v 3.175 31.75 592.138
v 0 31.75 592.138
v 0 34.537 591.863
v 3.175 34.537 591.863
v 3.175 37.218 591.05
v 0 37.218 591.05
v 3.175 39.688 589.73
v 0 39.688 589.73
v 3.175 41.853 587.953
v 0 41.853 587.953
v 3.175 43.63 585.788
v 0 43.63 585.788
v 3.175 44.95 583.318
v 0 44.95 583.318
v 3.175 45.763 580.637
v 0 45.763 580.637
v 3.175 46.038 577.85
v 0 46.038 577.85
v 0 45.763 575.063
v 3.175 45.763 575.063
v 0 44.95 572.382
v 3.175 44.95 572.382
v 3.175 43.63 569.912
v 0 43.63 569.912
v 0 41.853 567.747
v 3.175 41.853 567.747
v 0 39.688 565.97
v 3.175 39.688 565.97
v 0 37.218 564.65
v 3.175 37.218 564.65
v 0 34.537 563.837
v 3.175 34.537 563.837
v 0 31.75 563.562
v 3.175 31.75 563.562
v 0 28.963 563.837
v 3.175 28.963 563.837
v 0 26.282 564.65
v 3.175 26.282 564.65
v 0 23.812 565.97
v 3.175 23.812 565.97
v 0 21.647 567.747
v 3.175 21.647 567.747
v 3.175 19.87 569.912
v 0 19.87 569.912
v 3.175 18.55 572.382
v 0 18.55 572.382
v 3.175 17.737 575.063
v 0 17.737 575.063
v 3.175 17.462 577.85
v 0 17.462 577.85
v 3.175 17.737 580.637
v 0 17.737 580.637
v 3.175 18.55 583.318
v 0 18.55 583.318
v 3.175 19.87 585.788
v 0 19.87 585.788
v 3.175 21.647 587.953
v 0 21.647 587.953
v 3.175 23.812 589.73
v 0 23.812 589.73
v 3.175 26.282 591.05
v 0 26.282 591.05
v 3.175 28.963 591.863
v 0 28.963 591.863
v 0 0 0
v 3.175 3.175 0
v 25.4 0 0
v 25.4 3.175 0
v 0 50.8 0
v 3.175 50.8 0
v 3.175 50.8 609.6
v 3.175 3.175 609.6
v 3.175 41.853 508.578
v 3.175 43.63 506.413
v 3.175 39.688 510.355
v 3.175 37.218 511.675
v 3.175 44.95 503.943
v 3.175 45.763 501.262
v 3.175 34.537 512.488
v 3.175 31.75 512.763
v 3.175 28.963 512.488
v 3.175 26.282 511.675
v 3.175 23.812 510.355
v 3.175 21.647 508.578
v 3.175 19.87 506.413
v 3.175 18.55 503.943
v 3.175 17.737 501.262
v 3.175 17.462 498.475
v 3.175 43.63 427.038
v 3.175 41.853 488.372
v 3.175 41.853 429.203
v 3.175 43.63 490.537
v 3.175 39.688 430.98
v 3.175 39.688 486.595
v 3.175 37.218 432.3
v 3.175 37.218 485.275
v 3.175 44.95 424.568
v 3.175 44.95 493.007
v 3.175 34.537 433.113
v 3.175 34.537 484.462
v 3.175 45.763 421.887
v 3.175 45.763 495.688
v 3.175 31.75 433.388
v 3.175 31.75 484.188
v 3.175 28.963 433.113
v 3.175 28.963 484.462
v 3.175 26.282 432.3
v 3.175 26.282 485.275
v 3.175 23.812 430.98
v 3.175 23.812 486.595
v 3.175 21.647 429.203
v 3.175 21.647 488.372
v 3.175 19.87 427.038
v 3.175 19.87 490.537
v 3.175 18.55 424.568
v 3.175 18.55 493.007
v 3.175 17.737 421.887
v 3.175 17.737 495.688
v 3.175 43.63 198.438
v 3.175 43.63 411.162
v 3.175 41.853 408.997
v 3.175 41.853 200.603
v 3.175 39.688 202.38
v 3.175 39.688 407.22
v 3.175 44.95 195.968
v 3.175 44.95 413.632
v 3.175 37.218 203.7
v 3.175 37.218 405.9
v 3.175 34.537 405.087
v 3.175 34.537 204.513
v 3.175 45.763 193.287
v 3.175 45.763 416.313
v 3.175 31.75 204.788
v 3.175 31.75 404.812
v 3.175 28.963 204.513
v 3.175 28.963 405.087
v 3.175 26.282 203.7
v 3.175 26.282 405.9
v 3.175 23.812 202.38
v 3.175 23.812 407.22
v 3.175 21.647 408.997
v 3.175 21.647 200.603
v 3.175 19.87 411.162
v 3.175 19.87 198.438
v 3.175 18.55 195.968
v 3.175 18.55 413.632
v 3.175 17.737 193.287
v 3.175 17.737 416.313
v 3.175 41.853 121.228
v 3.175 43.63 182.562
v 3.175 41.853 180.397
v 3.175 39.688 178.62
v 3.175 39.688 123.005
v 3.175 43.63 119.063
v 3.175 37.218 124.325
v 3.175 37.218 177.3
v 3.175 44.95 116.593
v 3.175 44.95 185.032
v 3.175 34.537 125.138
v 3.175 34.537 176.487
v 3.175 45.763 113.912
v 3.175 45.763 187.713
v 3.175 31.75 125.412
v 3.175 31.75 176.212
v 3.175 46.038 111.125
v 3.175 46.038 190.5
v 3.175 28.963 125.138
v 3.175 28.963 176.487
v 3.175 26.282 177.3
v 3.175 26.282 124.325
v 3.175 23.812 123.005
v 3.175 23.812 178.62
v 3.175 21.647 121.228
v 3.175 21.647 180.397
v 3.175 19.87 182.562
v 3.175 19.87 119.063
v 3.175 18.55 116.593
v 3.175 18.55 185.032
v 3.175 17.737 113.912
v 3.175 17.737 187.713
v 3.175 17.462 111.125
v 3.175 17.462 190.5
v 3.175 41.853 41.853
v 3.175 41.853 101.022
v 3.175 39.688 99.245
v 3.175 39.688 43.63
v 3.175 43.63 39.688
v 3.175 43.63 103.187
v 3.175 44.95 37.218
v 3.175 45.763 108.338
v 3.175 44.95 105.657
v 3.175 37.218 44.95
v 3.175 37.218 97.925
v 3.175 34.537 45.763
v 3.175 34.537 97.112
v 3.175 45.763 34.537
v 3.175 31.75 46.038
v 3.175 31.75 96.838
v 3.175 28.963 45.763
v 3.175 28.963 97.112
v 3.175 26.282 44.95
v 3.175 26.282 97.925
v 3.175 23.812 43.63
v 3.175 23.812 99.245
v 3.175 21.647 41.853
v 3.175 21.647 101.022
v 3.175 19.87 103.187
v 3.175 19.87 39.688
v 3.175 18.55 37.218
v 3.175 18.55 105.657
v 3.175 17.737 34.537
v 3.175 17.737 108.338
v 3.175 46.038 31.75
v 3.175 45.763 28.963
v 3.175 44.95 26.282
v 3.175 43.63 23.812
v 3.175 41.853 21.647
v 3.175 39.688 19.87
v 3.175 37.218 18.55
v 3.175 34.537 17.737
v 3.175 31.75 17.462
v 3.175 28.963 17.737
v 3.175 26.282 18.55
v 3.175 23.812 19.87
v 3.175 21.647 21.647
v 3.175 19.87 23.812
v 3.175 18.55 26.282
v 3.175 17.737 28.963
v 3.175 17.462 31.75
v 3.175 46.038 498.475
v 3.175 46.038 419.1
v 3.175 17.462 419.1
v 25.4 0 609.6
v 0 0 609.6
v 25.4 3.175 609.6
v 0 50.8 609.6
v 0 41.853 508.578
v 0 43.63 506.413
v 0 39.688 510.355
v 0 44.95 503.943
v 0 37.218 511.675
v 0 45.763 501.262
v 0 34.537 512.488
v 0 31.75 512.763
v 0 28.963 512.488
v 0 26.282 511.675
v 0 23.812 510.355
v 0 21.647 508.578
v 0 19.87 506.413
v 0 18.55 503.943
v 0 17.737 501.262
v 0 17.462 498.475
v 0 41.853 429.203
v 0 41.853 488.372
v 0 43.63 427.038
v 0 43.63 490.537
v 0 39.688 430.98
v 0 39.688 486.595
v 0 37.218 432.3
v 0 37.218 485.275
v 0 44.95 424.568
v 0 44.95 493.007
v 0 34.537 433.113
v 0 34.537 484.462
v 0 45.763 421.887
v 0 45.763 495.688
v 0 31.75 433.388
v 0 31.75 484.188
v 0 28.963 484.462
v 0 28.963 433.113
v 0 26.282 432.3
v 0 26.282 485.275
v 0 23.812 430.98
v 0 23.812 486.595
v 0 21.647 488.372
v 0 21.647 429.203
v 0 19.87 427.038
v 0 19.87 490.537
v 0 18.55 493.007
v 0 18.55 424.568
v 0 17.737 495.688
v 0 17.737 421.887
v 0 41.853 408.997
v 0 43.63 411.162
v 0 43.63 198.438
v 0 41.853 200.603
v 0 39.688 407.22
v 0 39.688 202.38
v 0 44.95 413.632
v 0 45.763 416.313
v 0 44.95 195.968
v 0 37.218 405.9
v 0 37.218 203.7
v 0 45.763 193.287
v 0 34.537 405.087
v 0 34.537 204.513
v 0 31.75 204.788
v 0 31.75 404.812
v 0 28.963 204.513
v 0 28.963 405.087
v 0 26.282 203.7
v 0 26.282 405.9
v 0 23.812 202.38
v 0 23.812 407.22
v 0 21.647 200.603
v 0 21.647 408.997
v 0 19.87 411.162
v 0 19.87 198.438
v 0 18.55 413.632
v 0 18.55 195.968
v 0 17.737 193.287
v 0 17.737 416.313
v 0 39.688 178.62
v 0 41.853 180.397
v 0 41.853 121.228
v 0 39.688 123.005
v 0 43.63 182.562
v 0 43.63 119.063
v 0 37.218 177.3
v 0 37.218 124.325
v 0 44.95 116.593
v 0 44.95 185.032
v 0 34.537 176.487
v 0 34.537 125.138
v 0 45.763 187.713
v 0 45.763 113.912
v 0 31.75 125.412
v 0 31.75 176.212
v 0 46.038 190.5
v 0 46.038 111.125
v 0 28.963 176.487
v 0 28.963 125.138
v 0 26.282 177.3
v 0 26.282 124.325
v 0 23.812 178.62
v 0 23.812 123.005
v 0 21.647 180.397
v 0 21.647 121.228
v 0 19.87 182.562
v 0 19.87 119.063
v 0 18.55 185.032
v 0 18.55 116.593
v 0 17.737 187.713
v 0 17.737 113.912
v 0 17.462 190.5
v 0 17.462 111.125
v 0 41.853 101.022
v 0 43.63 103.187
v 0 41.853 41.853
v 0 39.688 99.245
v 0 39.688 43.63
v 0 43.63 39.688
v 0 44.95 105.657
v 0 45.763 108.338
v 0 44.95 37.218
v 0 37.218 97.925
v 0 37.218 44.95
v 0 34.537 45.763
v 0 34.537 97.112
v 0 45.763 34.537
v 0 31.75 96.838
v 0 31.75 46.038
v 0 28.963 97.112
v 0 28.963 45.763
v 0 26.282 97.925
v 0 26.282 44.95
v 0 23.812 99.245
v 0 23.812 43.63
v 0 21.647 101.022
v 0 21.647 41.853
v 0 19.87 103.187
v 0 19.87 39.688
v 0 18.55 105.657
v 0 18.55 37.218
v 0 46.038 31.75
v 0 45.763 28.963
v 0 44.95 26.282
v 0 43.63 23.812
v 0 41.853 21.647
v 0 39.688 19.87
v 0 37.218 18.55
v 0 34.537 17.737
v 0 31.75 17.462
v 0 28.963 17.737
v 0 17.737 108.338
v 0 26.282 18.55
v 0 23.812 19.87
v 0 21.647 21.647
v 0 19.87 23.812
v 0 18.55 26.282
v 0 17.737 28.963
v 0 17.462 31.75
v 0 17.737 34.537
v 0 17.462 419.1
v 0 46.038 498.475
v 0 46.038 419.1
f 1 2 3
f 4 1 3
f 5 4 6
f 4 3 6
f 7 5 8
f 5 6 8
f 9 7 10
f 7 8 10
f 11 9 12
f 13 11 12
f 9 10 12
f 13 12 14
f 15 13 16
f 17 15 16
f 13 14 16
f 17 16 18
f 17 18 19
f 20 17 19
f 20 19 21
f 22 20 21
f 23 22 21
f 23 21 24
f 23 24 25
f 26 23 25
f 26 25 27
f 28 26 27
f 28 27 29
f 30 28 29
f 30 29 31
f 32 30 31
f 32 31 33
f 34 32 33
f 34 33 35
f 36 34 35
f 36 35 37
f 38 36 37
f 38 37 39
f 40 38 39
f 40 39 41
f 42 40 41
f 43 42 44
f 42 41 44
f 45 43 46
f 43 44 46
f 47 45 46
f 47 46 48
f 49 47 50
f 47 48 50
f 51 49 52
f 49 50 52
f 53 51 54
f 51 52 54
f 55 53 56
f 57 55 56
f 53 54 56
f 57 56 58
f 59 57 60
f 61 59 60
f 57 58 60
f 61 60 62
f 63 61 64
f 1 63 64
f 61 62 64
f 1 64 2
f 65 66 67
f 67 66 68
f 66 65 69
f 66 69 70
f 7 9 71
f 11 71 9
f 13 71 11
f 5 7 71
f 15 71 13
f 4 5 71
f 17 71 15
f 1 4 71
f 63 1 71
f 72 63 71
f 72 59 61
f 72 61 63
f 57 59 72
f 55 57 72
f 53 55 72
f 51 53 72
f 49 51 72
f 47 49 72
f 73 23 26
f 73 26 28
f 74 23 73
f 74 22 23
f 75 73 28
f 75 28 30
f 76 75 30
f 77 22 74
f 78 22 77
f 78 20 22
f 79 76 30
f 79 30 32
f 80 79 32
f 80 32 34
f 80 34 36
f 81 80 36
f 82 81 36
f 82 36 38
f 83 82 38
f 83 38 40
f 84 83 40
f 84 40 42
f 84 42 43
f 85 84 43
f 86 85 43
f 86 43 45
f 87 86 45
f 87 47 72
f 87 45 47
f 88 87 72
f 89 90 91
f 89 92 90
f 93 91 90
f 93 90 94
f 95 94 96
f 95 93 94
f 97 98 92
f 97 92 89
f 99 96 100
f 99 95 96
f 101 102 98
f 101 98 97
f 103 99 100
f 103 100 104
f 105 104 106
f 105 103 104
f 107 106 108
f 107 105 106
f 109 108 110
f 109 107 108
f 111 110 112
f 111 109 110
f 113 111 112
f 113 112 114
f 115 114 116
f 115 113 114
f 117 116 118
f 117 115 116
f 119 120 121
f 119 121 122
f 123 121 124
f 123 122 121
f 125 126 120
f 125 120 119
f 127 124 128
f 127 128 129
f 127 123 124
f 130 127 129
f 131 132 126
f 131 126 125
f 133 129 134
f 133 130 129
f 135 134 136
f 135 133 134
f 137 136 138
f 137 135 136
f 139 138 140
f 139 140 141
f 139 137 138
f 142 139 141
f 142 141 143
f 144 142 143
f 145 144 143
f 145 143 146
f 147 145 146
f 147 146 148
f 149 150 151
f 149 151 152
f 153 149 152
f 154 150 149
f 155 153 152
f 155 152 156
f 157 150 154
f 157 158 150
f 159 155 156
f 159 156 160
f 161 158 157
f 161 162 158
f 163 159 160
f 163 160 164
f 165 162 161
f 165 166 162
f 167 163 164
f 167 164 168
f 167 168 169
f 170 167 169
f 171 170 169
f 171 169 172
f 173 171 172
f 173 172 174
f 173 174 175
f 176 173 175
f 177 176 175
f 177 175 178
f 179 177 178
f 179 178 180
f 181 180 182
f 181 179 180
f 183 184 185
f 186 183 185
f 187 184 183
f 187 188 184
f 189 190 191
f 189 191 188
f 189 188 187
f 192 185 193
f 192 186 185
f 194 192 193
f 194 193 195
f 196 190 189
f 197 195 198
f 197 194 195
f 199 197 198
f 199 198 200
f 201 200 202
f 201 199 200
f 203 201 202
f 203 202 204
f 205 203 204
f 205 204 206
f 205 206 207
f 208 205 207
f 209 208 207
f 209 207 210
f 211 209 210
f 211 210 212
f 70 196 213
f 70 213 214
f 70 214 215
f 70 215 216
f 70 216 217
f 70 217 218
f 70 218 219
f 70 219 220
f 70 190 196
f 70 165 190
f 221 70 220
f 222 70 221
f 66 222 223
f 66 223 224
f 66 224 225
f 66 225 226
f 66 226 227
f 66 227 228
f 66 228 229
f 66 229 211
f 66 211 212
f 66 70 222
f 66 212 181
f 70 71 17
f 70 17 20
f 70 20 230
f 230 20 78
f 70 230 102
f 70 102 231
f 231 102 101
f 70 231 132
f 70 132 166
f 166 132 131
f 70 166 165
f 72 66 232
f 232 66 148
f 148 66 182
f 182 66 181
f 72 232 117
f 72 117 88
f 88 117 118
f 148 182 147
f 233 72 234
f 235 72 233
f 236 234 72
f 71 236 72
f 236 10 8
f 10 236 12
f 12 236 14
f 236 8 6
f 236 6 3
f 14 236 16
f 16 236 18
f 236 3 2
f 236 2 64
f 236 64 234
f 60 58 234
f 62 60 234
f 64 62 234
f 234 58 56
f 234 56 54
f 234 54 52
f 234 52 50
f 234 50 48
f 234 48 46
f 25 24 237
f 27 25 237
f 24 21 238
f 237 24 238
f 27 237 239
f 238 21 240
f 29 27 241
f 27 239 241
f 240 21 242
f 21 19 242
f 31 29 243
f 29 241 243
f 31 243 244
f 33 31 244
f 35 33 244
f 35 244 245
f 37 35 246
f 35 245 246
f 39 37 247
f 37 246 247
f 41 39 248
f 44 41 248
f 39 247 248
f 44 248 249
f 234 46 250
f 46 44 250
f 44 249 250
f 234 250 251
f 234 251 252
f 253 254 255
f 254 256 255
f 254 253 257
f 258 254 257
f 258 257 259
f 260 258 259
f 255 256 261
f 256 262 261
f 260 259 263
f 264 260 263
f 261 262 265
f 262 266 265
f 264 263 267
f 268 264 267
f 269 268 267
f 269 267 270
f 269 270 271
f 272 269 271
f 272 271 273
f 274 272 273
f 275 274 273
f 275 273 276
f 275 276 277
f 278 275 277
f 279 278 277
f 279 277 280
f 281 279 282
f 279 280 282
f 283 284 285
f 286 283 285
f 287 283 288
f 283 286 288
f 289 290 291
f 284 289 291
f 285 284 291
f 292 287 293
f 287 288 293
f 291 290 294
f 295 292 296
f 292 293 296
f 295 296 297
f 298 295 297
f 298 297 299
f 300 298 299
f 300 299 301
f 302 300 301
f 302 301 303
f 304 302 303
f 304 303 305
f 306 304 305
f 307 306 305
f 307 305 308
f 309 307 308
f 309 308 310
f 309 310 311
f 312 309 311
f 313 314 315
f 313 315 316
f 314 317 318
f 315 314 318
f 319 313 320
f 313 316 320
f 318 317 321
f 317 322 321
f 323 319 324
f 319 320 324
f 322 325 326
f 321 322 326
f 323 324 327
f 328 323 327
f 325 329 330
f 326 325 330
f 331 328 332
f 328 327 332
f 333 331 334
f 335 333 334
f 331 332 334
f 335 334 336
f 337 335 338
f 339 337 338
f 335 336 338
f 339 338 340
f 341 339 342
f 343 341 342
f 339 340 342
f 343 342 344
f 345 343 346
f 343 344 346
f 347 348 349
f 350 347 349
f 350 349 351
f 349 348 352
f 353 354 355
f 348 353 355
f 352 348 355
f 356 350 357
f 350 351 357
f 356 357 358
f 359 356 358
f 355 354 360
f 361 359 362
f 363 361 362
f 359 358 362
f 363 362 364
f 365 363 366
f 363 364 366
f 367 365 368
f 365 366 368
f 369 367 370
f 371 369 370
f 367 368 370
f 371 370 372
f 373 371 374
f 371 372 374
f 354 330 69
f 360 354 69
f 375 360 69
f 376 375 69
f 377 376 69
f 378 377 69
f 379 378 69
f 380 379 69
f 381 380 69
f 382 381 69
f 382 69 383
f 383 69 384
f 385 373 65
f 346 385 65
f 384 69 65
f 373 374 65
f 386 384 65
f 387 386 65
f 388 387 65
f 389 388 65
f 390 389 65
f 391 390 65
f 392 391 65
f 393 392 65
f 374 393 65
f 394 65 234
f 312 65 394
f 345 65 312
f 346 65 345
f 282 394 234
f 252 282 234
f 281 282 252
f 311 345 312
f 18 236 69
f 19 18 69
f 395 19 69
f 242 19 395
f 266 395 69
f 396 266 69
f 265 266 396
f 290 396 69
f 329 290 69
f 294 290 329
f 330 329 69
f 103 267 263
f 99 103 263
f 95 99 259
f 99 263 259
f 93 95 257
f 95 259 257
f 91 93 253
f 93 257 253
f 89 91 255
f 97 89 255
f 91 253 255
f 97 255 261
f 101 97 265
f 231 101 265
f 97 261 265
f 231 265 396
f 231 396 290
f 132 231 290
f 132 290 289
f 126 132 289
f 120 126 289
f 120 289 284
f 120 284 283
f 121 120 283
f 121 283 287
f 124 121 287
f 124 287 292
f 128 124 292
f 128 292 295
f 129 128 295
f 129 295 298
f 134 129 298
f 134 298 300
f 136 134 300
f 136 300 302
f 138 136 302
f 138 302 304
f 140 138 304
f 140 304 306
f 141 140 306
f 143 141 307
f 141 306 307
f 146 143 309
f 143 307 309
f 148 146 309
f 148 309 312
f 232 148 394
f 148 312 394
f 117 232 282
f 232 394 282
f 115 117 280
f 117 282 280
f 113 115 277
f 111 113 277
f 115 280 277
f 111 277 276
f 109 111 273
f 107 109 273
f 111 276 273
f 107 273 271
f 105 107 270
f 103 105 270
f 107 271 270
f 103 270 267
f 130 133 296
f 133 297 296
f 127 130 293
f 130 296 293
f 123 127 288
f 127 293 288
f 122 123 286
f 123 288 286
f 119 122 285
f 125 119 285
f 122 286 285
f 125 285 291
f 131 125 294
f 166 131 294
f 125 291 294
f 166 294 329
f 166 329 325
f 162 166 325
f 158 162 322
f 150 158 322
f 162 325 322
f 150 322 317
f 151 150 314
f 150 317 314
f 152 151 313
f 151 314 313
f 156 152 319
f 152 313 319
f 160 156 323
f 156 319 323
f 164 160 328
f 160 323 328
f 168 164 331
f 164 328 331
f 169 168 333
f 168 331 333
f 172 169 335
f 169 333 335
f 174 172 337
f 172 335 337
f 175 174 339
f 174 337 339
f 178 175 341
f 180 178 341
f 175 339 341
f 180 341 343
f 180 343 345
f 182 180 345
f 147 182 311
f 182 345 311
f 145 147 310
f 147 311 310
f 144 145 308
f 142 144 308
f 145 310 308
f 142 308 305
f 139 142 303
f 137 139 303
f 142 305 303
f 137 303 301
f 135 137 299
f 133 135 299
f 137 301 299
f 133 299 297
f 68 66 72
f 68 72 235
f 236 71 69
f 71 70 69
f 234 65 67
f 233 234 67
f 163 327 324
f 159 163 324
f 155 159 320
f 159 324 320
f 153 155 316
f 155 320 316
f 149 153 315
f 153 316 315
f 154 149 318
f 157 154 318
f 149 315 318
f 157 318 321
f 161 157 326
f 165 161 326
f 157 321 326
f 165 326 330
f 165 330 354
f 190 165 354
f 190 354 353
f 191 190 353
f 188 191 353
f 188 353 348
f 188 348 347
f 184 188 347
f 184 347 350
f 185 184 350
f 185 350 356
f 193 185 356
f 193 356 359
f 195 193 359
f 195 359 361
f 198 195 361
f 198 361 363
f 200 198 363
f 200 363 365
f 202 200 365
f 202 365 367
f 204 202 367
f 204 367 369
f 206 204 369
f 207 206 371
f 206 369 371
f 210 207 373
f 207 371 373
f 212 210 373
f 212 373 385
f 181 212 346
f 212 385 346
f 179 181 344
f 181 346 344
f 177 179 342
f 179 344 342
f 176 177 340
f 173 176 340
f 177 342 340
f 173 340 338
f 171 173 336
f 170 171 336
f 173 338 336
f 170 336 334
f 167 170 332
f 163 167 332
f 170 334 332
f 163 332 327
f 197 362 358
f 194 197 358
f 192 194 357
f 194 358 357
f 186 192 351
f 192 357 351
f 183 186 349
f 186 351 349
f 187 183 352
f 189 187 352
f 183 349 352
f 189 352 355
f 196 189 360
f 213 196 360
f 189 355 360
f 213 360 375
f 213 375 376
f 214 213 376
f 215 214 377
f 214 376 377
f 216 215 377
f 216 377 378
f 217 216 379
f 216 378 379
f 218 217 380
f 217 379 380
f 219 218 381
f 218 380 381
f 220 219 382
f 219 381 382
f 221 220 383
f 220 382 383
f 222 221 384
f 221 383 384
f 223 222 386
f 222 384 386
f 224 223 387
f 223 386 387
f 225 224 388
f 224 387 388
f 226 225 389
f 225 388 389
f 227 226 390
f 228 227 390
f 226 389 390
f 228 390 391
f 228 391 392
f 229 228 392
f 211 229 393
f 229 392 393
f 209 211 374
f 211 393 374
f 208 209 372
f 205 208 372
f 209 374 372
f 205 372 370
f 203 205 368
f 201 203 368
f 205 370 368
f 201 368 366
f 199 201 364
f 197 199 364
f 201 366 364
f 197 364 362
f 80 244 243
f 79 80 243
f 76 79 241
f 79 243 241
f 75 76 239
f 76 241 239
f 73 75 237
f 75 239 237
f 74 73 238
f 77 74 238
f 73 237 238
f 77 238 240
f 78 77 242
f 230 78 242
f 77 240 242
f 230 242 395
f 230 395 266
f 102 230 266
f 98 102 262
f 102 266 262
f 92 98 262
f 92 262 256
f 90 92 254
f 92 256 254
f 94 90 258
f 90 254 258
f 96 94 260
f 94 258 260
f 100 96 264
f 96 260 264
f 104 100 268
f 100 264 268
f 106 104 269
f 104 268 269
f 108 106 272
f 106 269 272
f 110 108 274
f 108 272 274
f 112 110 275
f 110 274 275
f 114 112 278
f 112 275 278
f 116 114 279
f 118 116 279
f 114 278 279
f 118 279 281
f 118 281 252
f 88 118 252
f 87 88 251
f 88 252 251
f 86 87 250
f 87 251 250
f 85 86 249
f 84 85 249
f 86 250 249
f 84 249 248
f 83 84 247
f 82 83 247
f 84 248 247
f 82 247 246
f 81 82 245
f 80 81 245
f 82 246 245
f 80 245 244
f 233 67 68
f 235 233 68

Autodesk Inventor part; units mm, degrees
ref_plane "YZ Plane" through (0, 0, 0) normal (1, 0, 0) x (0, 1, 0)
ref_plane "XZ Plane" through (0, 0, 0) normal (0, 1, 0) x (-1, 0, 0)
ref_plane "XY Plane" through (0, 0, 0) normal (0, 0, 1) x (1, 0, 0)
sketch "Sketch1" plane through (0, 0, 0) normal (0, 0, 1) x (1, 0, 0)
  line L0 (0, 0) -> (25.4, 0)
  line L1 (25.4, 0) -> (25.4, 3.175)
  line L2 (3.175, 50.8) -> (0, 50.8)
  line L3 (0, 50.8) -> (0, 0)
  line L4 (3.175, 50.8) -> (3.175, 3.175)
  line L5 (3.175, 3.175) -> (25.4, 3.175)
  dimension "d0" = 50.8
  dimension "d1" = 25.4
  dimension "d2" = 3.175
  dimension "d3" = 3.175
extrude "Extrusion1" add sketch "Sketch1" along normal blind 609.6
sketch "Sketch2" plane through (0, 0, 0) normal (-1, 0, 0) x (0, 0, 1)
  line L0 (609.6, 0) -> (609.6, 50.8) projected
  line L1 (0, 50.8) -> (609.6, 50.8) projected
  line L2 (0, 50.8) -> (0, 0) projected
  circle A0 centre (577.85, 31.75) radius 14.2875
  circle A1 centre (419.1, 31.75) radius 14.2875
  circle A2 centre (190.5, 31.75) radius 14.2875
  circle A3 centre (31.75, 31.75) radius 14.2875
  circle A4 centre (498.475, 31.75) radius 14.2875
  circle A5 centre (111.125, 31.75) radius 14.2875
  dimension "d6" = 28.575
  dimension "d7" = 31.75
  dimension "d8" = 19.05
  dimension "d9" = 28.575
  dimension "d10" = 228.6
  dimension "d11" = 31.75
  dimension "d15" = 158.75
  dimension "d16" = 79.375
  dimension "d17" = 79.375
  dimension "d18" = 609.6
extrude "Extrusion2" cut sketch "Sketch2" against normal through all
equation "\"d2\" = d3"
equation "\"d11\" = d7"
equation "\"d15\" = 0.5 * d18 - 0.5 * d10 - d7"
equation "\"d16\" = 0.5 * d15"
equation "\"d17\" = d16"
properties part number "maipulator L frame front"
